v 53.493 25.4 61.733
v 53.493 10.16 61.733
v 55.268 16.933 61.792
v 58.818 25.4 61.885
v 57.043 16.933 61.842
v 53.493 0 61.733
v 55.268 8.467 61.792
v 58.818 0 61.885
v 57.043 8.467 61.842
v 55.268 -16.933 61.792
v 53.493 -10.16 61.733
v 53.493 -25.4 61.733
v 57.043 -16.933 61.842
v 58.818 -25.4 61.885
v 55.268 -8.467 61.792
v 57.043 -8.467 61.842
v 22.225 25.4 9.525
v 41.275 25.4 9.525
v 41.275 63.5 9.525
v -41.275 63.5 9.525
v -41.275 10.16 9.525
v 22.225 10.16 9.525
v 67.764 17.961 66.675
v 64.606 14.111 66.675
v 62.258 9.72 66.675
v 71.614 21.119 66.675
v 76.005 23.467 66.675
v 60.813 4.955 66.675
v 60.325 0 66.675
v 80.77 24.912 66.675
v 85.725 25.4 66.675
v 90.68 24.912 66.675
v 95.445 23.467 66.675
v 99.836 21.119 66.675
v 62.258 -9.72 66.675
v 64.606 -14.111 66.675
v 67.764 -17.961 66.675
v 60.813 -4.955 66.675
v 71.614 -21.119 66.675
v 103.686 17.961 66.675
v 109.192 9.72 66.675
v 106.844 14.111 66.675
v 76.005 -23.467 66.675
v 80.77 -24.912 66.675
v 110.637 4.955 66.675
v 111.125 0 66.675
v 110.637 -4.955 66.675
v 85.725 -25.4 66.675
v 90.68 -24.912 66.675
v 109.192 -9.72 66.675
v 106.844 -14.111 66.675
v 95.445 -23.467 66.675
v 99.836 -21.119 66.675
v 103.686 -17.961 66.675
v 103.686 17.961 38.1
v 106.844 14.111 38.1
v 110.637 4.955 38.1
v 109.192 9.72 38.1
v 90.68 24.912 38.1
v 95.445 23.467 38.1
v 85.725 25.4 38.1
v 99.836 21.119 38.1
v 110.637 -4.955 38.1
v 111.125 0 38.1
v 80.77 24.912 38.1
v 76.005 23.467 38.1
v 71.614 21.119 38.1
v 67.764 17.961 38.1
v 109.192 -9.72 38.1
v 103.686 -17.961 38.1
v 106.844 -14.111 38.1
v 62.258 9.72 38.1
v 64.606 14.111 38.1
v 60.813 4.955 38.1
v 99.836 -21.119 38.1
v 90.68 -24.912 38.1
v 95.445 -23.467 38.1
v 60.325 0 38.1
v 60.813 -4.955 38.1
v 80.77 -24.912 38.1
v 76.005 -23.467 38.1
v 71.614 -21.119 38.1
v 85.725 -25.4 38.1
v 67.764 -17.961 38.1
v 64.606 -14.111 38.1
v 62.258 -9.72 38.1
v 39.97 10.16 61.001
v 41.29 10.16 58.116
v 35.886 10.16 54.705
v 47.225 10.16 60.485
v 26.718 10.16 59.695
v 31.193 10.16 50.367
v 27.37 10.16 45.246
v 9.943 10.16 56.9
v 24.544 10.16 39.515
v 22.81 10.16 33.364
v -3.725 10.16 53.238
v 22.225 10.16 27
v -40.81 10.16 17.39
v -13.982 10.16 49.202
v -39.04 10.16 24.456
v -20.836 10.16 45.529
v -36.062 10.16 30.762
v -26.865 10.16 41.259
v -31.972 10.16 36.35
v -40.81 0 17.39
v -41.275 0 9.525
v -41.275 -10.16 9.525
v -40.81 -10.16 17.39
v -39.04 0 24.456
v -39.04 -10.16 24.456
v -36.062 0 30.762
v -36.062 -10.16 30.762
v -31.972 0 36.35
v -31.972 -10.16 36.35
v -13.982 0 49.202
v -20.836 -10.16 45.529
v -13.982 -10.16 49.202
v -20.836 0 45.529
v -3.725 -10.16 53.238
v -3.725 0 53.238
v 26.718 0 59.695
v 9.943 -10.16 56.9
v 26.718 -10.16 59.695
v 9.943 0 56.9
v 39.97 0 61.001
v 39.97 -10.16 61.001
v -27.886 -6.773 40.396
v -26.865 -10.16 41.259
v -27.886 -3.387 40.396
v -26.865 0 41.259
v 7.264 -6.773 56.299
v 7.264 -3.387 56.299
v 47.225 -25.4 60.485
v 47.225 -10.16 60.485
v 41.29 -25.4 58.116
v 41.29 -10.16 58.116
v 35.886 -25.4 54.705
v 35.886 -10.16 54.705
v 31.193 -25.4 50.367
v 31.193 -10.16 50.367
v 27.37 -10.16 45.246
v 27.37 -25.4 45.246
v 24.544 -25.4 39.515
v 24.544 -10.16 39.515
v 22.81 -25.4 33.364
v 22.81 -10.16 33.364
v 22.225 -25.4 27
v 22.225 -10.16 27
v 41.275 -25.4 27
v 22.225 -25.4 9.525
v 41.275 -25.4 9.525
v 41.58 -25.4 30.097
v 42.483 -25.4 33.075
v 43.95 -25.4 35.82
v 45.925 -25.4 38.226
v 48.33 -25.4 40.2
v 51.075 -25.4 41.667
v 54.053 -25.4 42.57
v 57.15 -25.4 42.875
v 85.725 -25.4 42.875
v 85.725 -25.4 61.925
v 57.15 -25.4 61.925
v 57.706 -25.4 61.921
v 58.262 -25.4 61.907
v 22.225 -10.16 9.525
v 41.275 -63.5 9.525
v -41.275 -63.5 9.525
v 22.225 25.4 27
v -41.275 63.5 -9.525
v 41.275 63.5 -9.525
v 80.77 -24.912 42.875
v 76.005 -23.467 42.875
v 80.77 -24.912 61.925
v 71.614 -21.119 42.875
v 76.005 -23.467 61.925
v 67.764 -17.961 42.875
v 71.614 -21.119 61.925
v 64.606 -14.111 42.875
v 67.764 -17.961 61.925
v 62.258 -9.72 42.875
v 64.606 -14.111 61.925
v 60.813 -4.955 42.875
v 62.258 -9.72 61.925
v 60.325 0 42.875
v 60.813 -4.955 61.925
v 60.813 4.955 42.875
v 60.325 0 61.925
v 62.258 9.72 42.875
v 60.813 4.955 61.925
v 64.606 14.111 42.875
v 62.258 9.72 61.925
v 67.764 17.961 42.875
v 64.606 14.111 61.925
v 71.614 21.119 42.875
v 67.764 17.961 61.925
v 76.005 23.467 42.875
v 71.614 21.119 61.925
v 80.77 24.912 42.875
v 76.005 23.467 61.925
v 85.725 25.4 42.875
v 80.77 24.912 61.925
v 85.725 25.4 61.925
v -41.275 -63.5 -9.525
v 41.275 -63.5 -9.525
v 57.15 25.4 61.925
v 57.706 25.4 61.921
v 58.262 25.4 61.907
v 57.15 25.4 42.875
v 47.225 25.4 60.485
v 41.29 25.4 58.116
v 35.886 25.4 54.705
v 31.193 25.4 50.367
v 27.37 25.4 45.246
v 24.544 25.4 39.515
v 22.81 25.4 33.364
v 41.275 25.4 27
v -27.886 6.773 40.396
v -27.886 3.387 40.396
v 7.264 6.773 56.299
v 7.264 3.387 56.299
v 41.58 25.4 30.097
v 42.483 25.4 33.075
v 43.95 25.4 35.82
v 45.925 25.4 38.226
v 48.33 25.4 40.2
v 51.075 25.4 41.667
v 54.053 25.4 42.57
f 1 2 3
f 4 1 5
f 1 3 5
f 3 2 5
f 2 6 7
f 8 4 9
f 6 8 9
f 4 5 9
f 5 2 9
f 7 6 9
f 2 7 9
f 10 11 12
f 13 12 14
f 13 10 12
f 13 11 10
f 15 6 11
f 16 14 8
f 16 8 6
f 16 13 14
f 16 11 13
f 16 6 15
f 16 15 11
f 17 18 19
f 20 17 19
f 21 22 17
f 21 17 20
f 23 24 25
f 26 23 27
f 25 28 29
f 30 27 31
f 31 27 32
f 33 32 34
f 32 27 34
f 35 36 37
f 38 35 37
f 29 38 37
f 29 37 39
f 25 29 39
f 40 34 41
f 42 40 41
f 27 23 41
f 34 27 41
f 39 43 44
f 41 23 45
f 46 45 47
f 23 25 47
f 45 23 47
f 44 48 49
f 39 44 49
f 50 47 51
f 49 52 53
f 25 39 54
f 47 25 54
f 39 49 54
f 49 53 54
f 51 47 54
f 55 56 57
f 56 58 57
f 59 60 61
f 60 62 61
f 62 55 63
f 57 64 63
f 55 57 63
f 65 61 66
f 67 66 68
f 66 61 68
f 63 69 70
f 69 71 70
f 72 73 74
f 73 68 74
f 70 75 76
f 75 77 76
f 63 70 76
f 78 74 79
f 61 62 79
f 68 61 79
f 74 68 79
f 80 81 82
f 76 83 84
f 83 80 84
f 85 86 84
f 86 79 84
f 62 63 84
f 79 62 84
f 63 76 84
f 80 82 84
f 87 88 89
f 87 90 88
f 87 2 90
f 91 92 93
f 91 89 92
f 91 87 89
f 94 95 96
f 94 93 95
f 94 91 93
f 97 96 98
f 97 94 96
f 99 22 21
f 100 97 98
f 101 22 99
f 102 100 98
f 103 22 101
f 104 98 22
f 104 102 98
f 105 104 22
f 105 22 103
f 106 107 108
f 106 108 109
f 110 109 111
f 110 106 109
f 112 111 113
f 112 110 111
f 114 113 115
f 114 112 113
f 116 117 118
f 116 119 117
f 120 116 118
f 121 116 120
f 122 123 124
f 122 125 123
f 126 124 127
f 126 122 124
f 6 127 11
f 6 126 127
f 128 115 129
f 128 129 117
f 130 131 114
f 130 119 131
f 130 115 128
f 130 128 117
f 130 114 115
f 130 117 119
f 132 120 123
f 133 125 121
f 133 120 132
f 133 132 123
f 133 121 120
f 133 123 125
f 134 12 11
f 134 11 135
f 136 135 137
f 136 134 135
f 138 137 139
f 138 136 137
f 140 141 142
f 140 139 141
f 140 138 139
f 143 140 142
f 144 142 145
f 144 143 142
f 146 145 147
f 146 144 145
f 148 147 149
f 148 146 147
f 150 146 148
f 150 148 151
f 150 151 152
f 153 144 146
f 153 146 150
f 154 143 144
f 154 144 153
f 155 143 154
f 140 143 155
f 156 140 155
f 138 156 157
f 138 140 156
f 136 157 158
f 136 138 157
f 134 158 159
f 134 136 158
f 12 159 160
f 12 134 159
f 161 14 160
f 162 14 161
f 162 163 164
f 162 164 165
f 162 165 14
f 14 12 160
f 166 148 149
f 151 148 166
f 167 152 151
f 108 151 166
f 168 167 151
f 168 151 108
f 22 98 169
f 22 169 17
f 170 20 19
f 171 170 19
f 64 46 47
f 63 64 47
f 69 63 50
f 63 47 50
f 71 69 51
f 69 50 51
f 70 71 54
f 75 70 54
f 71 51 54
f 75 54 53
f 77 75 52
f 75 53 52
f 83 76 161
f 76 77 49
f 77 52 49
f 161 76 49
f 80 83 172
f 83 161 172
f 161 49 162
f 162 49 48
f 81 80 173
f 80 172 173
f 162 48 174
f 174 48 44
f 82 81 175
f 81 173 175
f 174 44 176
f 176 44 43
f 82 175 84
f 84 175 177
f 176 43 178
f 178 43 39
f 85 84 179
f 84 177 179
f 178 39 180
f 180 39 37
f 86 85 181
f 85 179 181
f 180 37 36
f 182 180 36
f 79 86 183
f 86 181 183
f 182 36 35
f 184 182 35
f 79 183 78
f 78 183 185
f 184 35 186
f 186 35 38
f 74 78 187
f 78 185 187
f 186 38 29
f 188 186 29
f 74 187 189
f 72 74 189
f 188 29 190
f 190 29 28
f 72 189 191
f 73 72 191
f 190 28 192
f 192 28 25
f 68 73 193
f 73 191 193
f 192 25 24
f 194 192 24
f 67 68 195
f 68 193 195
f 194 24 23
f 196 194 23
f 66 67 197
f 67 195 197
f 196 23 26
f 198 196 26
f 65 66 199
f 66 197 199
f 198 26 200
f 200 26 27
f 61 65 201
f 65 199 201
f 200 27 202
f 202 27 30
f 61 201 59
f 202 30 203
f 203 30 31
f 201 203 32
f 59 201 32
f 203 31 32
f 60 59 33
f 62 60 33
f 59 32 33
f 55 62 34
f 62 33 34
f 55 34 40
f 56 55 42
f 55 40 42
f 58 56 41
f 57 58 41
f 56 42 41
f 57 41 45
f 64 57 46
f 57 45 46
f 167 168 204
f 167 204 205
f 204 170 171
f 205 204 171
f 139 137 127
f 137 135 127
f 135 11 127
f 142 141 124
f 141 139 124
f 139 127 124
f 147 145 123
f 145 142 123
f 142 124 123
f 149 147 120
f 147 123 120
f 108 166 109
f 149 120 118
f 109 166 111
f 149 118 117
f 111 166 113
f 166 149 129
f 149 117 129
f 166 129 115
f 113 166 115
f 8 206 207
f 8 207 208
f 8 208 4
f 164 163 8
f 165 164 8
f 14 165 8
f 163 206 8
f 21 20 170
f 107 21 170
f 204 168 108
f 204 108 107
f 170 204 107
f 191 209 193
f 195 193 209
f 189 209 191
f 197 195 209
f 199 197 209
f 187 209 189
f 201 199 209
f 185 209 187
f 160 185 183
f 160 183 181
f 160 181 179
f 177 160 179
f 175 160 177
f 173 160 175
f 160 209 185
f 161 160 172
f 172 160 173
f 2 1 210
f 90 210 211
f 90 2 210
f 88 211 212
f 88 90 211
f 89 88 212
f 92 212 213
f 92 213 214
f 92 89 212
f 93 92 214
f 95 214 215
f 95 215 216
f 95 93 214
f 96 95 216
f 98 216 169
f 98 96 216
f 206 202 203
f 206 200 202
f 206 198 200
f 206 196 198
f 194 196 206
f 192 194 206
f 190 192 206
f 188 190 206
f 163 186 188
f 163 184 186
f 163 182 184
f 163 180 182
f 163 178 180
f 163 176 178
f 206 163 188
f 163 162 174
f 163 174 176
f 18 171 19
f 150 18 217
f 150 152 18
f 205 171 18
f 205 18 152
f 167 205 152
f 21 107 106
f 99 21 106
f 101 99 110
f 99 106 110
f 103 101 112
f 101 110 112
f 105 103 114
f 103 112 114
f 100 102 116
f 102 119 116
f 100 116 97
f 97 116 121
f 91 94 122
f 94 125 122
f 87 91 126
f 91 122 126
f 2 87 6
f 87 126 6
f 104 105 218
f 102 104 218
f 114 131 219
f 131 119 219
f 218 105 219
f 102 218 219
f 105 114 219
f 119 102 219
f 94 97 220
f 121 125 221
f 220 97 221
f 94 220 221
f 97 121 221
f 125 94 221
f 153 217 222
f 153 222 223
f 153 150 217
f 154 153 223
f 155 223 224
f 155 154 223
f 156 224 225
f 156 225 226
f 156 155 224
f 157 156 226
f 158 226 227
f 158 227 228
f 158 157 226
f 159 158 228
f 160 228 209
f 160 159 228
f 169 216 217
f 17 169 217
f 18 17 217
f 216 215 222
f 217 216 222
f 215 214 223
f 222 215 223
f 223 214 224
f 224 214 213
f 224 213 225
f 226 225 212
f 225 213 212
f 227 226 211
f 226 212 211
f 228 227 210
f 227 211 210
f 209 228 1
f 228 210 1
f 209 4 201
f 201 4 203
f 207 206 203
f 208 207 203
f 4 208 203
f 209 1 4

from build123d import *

# Parameters (mm, degrees)
F1_DEPTH = 63.5
F0_W     = 25.4
F0_H     = 19.05
F2_DEPTH = 25.4
F4_DEPTH = 10.16


with BuildPart() as f1:
    # F0 (on Front) → F1 (new body, symmetric)
    with BuildSketch(Plane.XZ):
        Polygon((22.225, 9.525), (-41.275, 9.525), (-41.275, -9.525), (41.275, -9.525), (41.275, 9.525), align=None)
    extrude(amount=F1_DEPTH, both=True)

    # F0 (on Front) → F2 (join, symmetric)
    with BuildSketch(Plane.XZ):
        with Locations((73.025, 52.4002)):
            Rectangle(F0_W, F0_H)
        with BuildLine():
            Line((22.225, 27.0002), (22.225, 9.525))
            Line((22.225, 9.525), (41.275, 9.525))
            Line((41.275, 9.525), (41.275, 27.0002))
            ThreePointArc((41.275, 27.0002), (45.9246798487, 38.2255201513), (57.15, 42.8752))
            Line((57.15, 42.8752), (60.325, 42.8752))
            Line((60.325, 42.8752), (60.325, 61.9252))
            Line((60.325, 61.9252), (57.15, 61.9252))
            ThreePointArc((57.15, 61.9252), (57.9844058032, 61.9152310319), (58.8183352619, 61.8853298185))
            add(Edge.make_bspline(
                [(53.4926140261, 61.7331692488), (55.2678452384, 61.7956996578), (57.0438857135, 61.8460829523), (58.8183352619, 61.8853298185)],
                knots=[108.9494313883, 108.9494313883, 108.9494313883, 108.9494313883, 112.9614089083, 112.9614089083, 112.9614089083, 112.9614089083], degree=3))
            ThreePointArc((53.4926140261, 61.7331692488), (31.1934032456, 50.3670720613), (22.225, 27.0002))
        make_face()
    extrude(amount=F2_DEPTH, both=True)

    # F0 (on Front) → F3 (revolve)
    with BuildSketch(Plane.XZ):
        Polygon((85.725, 66.675), (85.725, 61.9252), (85.725, 42.8752), (85.725, 38.1), (111.125, 38.1), (111.125, 66.675), align=None)
    revolve(axis=Axis((85.725, 0, 52.3875), (0, 0, -1)))

    # F0 (on Front) → F4 (join, symmetric)
    with BuildSketch(Plane.XZ):
        with BuildLine():
            add(Edge.make_bspline(
                [(-41.275, 9.525), (-42.3271025426, 49.3791151261), (5.2843600658, 60.0350908151), (53.4926140261, 61.7331692488)],
                knots=[0, 0, 0, 0, 108.9494313883, 108.9494313883, 108.9494313883, 108.9494313883], degree=3))
            Line((-41.275, 9.525), (22.225, 9.525))
            Line((22.225, 9.525), (22.225, 27.0002))
            ThreePointArc((22.225, 27.0002), (31.1934032456, 50.3670720613), (53.4926140261, 61.7331692488))
        make_face()
    extrude(amount=F4_DEPTH, both=True)


solid = f1.part
